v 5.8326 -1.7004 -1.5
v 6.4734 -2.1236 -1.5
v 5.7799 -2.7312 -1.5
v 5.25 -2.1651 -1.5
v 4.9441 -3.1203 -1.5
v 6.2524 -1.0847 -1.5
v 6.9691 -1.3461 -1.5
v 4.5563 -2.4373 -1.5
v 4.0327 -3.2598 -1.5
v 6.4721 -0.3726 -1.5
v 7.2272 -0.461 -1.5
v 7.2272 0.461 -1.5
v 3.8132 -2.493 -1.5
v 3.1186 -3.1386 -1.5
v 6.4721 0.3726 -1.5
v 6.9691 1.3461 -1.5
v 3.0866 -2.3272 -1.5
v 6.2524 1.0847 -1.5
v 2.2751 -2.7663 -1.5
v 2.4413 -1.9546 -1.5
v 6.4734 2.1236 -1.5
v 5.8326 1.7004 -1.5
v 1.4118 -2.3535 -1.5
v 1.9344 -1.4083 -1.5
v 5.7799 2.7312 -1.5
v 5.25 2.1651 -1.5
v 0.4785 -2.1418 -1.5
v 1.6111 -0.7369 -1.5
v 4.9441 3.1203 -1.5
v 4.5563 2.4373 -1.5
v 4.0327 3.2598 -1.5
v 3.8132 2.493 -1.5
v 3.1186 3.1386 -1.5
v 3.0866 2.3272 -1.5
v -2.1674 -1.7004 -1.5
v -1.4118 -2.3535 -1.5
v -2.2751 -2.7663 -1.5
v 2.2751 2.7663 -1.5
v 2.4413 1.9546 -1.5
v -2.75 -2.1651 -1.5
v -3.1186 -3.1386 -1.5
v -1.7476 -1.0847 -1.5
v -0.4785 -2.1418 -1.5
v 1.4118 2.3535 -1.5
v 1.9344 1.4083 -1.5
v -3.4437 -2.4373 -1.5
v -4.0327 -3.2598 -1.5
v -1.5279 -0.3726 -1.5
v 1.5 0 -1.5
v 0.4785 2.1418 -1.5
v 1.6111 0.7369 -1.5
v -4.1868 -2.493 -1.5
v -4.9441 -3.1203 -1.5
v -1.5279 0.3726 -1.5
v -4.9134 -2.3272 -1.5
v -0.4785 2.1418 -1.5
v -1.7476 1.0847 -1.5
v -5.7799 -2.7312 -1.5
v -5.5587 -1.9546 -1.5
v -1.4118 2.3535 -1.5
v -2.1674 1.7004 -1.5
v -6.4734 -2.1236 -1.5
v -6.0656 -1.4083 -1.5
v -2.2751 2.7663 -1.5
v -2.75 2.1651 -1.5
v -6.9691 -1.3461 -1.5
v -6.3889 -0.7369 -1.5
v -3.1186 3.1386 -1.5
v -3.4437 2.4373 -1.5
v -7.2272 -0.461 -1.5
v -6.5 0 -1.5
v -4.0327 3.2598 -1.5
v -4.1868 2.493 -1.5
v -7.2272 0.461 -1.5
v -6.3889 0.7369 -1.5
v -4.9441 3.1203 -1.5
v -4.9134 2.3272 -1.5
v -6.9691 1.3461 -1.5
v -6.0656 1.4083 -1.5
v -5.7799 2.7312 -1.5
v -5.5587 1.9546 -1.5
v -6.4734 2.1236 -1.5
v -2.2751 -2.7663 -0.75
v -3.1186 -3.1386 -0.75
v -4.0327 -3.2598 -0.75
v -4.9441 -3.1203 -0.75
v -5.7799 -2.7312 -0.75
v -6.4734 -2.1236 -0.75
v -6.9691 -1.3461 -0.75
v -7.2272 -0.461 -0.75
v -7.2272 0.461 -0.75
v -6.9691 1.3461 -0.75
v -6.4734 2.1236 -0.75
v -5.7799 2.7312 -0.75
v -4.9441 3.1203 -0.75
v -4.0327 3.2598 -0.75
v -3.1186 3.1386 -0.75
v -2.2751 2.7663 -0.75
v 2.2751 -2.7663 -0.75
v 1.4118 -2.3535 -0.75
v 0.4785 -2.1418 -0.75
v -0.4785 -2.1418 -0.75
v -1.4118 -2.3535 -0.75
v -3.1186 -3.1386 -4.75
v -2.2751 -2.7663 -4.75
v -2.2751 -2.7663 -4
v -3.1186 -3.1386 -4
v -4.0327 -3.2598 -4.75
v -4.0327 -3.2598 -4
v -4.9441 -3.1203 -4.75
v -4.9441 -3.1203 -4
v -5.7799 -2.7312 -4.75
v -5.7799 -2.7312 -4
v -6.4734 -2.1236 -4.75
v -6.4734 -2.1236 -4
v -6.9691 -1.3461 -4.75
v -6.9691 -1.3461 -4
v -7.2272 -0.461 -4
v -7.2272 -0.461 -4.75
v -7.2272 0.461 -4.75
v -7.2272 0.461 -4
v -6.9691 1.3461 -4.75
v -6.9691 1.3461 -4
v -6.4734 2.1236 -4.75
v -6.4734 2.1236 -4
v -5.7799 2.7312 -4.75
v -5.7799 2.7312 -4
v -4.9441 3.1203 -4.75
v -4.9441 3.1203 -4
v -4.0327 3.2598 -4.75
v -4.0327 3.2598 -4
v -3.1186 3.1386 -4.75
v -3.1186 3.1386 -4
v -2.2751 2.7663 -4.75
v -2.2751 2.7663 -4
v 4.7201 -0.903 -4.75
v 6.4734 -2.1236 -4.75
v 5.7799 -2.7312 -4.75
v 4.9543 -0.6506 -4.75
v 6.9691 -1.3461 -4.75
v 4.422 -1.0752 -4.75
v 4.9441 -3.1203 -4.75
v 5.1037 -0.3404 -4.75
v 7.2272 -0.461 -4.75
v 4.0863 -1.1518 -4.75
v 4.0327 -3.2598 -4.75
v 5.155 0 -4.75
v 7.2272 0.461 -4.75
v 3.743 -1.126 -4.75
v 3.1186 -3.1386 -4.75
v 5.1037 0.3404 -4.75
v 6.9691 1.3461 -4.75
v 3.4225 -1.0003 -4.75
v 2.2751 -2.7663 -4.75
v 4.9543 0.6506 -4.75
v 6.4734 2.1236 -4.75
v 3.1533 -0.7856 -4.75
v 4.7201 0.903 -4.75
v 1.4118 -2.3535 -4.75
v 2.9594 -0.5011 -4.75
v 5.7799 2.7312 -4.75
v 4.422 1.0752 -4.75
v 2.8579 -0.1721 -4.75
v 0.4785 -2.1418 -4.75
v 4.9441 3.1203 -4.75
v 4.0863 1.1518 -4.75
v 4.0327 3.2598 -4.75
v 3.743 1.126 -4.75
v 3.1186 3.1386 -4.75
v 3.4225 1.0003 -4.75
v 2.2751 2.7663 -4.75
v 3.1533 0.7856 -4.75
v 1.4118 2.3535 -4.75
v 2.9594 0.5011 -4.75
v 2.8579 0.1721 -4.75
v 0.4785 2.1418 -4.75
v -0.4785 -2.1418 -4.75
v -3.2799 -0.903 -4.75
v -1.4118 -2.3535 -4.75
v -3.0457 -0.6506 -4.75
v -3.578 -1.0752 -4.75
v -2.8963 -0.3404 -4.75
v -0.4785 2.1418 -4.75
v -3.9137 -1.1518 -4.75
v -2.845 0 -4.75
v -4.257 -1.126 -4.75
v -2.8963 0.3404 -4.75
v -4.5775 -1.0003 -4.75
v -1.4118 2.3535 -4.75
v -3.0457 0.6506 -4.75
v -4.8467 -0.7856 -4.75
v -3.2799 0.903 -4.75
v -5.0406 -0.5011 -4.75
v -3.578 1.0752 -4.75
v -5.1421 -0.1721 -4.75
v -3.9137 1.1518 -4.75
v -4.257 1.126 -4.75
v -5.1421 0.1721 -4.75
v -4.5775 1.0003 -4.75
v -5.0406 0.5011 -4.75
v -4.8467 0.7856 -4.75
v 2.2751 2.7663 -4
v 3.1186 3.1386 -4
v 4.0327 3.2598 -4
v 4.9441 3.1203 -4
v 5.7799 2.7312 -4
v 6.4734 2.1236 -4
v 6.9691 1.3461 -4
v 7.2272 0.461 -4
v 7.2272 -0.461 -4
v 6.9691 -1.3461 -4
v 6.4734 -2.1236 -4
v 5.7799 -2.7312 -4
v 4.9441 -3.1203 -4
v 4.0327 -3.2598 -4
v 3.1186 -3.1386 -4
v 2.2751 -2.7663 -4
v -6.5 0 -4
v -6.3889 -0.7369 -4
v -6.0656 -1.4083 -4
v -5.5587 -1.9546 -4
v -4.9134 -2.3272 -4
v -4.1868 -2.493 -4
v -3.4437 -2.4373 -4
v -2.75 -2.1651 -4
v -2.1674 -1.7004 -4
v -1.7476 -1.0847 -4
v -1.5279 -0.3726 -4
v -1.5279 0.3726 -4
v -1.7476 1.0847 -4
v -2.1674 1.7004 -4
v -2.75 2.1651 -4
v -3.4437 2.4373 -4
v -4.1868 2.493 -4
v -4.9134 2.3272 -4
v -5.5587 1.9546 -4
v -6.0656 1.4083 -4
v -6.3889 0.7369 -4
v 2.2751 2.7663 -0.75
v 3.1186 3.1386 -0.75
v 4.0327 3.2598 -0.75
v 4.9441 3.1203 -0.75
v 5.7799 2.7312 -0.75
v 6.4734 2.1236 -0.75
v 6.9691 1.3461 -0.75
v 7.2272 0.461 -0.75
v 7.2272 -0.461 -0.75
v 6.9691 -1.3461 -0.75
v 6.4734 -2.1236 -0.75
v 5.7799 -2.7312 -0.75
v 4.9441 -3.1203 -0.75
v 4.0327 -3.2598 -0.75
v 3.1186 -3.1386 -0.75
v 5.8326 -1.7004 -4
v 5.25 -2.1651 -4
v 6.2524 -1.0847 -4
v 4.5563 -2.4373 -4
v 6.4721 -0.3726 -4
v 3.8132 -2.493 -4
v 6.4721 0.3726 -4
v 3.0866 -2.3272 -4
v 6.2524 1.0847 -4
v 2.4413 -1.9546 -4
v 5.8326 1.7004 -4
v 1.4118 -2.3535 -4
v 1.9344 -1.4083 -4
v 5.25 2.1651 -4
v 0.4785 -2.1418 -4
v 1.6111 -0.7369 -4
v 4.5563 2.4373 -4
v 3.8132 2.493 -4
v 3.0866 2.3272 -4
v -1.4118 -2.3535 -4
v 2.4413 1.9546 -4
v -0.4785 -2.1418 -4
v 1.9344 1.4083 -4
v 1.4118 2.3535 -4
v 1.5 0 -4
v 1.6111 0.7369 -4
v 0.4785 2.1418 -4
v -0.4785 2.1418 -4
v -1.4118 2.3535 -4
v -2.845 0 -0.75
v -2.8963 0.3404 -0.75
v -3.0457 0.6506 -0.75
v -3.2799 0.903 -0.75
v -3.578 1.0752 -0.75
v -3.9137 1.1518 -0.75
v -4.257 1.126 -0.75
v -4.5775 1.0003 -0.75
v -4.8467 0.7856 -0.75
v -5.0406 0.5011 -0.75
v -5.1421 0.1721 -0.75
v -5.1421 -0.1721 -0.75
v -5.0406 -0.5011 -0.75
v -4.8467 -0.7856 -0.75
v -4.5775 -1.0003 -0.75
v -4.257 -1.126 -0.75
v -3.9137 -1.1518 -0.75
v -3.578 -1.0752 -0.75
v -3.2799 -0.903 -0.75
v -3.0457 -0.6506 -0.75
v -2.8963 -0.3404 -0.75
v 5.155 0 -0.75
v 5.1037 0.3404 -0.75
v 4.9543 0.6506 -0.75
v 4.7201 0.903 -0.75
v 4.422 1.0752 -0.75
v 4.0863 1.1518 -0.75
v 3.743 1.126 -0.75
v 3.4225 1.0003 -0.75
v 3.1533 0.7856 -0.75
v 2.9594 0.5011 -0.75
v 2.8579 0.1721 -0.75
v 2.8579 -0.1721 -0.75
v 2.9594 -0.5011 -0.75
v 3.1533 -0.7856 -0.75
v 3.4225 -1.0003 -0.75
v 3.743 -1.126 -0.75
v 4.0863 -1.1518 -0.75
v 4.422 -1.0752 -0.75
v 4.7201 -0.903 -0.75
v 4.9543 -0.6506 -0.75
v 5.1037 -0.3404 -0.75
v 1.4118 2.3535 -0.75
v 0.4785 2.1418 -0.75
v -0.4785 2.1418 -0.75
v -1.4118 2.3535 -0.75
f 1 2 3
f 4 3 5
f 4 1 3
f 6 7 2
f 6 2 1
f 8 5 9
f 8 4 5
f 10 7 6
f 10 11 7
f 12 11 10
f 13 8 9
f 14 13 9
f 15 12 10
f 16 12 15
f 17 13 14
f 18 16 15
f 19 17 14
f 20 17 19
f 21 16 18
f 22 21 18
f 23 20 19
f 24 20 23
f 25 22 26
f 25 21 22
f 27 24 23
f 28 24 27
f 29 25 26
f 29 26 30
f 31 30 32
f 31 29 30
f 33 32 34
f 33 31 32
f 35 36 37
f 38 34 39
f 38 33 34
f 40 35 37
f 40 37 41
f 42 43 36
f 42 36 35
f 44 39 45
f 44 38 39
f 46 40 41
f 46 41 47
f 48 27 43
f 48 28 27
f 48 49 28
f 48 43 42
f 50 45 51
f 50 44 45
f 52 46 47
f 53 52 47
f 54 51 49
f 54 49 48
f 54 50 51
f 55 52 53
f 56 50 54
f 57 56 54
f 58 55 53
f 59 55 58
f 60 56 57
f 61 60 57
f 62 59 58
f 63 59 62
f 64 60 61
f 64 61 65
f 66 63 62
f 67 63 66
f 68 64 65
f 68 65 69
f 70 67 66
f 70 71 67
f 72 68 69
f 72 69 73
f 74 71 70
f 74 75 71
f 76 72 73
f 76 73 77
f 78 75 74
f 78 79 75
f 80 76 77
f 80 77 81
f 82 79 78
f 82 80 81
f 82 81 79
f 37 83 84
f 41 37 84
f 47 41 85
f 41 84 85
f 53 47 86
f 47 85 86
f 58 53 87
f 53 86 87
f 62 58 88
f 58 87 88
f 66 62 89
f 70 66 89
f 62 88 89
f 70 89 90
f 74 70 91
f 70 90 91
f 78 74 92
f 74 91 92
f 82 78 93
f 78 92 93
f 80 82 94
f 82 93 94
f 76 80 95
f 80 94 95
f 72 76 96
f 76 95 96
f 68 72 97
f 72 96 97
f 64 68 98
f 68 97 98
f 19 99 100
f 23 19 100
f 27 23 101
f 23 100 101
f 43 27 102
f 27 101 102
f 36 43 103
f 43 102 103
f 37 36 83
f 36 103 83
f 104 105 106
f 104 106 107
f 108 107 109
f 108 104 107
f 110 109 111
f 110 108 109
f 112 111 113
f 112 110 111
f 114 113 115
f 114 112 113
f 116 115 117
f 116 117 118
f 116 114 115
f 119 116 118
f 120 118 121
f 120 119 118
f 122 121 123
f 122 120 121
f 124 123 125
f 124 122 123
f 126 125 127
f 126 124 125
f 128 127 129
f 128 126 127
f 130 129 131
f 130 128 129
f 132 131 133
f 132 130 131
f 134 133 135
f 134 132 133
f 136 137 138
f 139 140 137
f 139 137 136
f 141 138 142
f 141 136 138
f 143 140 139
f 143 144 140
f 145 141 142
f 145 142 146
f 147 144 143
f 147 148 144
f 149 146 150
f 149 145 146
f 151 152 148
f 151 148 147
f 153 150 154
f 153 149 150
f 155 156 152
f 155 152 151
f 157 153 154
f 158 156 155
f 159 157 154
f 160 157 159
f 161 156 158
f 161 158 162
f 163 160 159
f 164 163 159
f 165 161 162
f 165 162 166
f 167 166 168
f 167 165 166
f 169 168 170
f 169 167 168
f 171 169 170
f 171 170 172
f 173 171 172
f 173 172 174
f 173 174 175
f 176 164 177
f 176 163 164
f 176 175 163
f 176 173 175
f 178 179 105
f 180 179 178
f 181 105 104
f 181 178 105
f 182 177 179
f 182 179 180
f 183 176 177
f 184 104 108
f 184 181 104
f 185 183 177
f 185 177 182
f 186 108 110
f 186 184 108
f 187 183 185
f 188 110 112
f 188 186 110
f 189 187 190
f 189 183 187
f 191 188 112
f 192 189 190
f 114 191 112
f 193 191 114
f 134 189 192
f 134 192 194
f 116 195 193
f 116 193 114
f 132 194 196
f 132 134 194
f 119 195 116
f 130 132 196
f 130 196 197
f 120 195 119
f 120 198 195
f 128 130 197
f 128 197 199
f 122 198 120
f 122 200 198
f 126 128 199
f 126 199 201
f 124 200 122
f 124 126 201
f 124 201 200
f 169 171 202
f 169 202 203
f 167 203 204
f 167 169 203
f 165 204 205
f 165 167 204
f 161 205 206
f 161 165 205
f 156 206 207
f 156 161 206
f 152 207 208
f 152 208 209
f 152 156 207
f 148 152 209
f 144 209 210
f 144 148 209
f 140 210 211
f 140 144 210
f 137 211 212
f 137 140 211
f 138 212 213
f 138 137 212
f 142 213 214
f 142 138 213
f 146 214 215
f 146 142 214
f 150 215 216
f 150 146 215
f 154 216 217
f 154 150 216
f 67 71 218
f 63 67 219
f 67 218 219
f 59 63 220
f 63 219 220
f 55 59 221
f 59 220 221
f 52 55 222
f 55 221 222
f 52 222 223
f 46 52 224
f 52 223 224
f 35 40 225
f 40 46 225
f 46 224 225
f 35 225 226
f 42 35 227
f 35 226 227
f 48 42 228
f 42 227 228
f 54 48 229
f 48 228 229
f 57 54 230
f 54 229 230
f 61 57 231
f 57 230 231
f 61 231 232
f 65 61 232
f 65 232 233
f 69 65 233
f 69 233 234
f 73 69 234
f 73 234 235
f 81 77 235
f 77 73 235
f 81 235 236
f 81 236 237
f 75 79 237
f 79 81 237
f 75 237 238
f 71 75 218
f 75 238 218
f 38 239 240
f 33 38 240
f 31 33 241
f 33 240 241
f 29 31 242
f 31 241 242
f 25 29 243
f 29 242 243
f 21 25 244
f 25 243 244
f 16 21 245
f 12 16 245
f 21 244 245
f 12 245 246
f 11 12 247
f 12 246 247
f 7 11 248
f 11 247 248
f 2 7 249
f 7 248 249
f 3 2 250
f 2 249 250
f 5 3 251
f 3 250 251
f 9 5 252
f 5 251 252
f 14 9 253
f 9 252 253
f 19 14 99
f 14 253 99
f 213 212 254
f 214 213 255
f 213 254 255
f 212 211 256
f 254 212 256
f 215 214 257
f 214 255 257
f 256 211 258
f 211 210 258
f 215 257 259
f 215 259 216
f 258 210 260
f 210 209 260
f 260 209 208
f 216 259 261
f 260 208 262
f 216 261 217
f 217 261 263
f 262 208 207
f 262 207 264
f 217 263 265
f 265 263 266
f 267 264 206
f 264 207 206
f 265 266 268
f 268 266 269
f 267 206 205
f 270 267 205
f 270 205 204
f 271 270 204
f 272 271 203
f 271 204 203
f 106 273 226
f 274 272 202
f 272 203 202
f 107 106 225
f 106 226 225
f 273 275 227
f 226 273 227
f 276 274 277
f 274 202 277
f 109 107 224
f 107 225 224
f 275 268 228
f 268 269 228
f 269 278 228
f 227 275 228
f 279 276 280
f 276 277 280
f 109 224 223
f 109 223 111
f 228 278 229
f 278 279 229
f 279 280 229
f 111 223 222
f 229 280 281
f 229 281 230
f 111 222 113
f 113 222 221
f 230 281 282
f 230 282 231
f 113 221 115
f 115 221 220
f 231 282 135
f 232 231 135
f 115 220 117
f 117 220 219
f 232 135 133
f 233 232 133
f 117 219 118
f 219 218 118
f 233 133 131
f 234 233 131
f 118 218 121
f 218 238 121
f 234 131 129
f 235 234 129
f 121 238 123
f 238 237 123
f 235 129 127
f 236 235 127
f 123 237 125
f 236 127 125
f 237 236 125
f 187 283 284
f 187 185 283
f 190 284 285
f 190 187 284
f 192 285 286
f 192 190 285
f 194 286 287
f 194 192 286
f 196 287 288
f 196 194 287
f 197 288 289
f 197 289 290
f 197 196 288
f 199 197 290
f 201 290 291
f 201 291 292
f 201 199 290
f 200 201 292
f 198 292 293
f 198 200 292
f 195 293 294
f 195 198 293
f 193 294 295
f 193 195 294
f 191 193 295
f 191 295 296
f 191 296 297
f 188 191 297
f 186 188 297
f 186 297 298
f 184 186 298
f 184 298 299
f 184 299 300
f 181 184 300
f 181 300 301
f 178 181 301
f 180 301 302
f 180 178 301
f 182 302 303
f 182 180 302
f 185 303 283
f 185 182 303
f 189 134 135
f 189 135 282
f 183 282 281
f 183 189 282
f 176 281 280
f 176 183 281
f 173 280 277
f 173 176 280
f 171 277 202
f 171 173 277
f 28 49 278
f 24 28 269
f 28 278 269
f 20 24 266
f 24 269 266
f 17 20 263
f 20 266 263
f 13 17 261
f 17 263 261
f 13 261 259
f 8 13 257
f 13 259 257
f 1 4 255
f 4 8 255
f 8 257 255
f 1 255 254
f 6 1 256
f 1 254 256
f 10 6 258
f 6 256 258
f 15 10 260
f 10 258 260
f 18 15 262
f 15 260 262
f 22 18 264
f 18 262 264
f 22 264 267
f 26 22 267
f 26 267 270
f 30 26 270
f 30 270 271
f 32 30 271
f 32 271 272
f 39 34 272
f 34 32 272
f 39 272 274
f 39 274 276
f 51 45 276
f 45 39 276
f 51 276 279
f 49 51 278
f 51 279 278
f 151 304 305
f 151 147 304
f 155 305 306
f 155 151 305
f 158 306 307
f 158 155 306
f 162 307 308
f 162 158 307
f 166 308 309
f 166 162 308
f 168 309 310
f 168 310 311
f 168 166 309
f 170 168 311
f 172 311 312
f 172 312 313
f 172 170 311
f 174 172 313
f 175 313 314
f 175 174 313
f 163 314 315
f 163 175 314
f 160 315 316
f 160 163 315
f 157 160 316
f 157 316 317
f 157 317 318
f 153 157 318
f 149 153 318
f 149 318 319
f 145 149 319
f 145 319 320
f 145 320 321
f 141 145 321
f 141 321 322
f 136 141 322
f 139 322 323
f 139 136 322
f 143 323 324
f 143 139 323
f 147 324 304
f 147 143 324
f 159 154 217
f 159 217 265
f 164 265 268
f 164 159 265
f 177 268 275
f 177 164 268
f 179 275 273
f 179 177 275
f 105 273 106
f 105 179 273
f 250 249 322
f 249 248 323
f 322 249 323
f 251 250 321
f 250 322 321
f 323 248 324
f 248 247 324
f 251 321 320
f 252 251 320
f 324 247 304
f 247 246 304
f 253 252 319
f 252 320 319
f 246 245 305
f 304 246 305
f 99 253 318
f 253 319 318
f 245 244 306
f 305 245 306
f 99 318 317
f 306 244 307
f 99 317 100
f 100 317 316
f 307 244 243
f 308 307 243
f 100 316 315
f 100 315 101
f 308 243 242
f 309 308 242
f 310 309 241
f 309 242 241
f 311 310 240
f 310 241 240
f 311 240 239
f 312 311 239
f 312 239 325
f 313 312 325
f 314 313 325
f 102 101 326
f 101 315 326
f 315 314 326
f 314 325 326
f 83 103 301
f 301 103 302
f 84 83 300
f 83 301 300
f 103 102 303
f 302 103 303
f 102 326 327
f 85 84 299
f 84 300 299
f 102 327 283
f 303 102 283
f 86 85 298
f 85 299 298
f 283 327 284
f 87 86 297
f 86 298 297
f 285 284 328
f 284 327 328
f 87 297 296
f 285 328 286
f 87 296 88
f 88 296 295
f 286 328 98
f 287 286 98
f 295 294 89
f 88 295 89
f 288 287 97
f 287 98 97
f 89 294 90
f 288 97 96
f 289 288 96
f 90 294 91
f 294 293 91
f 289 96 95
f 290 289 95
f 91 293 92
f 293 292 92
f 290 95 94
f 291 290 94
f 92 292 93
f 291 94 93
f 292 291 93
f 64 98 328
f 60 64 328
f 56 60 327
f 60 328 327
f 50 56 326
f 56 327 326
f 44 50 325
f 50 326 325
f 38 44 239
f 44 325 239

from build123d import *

# Parameters (mm, degrees)
SKETCH4_R           = 1.155
BOSS_EXTRUDE1_DEPTH = 0.75
SKETCH6_R           = 2.5
SKETCH6_R_2         = 1.155
BOSS_EXTRUDE2_DEPTH = 3.25


with BuildPart() as part:
    # Sketch4 → Boss-Extrude1 (new body)
    with BuildSketch(Plane.XY.offset(-4.75)):
        with BuildLine():
            ThreePointArc((-2.275132275, 2.766302827), (0, 2.11510717), (2.275132275, 2.766302827))
            ThreePointArc((2.275132275, 2.766302827), (7.26, 0), (2.275132275, -2.766302827))
            ThreePointArc((2.275132275, -2.766302827), (0, -2.11510717), (-2.275132275, -2.766302827))
            ThreePointArc((-2.275132275, -2.766302827), (-7.26, 0), (-2.275132275, 2.766302827))
        make_face()
        with Locations((-4, 0)):
            Circle(SKETCH4_R, mode=Mode.SUBTRACT)
        with Locations((4, 0)):
            Circle(SKETCH4_R, mode=Mode.SUBTRACT)
    boss_extrude1 = extrude(amount=BOSS_EXTRUDE1_DEPTH)

    # Sketch6 → Boss-Extrude2 (add)
    # profile 1 of 2: a face of its own
    with BuildSketch(Plane.XY.offset(-4)):
        with Locations(Location((-4, 0, 0), (0, 0, 180))):
            Circle(SKETCH6_R)
        with Locations((-4, 0)):
            Circle(SKETCH6_R_2, mode=Mode.SUBTRACT)
    # profile 2 of 2: a face of its own
    with BuildSketch(Plane.XY.offset(-4)):
        with Locations(Location((4, 0, 0), (0, 0, 180))):
            Circle(SKETCH6_R)
        with Locations((4, 0)):
            Circle(SKETCH6_R_2, mode=Mode.SUBTRACT)
    extrude(amount=BOSS_EXTRUDE2_DEPTH)

    # Mirror1: Boss-Extrude1 across plane
    add(boss_extrude1.mirror(Plane.XY.offset(-2.75)))


solid = part.part
